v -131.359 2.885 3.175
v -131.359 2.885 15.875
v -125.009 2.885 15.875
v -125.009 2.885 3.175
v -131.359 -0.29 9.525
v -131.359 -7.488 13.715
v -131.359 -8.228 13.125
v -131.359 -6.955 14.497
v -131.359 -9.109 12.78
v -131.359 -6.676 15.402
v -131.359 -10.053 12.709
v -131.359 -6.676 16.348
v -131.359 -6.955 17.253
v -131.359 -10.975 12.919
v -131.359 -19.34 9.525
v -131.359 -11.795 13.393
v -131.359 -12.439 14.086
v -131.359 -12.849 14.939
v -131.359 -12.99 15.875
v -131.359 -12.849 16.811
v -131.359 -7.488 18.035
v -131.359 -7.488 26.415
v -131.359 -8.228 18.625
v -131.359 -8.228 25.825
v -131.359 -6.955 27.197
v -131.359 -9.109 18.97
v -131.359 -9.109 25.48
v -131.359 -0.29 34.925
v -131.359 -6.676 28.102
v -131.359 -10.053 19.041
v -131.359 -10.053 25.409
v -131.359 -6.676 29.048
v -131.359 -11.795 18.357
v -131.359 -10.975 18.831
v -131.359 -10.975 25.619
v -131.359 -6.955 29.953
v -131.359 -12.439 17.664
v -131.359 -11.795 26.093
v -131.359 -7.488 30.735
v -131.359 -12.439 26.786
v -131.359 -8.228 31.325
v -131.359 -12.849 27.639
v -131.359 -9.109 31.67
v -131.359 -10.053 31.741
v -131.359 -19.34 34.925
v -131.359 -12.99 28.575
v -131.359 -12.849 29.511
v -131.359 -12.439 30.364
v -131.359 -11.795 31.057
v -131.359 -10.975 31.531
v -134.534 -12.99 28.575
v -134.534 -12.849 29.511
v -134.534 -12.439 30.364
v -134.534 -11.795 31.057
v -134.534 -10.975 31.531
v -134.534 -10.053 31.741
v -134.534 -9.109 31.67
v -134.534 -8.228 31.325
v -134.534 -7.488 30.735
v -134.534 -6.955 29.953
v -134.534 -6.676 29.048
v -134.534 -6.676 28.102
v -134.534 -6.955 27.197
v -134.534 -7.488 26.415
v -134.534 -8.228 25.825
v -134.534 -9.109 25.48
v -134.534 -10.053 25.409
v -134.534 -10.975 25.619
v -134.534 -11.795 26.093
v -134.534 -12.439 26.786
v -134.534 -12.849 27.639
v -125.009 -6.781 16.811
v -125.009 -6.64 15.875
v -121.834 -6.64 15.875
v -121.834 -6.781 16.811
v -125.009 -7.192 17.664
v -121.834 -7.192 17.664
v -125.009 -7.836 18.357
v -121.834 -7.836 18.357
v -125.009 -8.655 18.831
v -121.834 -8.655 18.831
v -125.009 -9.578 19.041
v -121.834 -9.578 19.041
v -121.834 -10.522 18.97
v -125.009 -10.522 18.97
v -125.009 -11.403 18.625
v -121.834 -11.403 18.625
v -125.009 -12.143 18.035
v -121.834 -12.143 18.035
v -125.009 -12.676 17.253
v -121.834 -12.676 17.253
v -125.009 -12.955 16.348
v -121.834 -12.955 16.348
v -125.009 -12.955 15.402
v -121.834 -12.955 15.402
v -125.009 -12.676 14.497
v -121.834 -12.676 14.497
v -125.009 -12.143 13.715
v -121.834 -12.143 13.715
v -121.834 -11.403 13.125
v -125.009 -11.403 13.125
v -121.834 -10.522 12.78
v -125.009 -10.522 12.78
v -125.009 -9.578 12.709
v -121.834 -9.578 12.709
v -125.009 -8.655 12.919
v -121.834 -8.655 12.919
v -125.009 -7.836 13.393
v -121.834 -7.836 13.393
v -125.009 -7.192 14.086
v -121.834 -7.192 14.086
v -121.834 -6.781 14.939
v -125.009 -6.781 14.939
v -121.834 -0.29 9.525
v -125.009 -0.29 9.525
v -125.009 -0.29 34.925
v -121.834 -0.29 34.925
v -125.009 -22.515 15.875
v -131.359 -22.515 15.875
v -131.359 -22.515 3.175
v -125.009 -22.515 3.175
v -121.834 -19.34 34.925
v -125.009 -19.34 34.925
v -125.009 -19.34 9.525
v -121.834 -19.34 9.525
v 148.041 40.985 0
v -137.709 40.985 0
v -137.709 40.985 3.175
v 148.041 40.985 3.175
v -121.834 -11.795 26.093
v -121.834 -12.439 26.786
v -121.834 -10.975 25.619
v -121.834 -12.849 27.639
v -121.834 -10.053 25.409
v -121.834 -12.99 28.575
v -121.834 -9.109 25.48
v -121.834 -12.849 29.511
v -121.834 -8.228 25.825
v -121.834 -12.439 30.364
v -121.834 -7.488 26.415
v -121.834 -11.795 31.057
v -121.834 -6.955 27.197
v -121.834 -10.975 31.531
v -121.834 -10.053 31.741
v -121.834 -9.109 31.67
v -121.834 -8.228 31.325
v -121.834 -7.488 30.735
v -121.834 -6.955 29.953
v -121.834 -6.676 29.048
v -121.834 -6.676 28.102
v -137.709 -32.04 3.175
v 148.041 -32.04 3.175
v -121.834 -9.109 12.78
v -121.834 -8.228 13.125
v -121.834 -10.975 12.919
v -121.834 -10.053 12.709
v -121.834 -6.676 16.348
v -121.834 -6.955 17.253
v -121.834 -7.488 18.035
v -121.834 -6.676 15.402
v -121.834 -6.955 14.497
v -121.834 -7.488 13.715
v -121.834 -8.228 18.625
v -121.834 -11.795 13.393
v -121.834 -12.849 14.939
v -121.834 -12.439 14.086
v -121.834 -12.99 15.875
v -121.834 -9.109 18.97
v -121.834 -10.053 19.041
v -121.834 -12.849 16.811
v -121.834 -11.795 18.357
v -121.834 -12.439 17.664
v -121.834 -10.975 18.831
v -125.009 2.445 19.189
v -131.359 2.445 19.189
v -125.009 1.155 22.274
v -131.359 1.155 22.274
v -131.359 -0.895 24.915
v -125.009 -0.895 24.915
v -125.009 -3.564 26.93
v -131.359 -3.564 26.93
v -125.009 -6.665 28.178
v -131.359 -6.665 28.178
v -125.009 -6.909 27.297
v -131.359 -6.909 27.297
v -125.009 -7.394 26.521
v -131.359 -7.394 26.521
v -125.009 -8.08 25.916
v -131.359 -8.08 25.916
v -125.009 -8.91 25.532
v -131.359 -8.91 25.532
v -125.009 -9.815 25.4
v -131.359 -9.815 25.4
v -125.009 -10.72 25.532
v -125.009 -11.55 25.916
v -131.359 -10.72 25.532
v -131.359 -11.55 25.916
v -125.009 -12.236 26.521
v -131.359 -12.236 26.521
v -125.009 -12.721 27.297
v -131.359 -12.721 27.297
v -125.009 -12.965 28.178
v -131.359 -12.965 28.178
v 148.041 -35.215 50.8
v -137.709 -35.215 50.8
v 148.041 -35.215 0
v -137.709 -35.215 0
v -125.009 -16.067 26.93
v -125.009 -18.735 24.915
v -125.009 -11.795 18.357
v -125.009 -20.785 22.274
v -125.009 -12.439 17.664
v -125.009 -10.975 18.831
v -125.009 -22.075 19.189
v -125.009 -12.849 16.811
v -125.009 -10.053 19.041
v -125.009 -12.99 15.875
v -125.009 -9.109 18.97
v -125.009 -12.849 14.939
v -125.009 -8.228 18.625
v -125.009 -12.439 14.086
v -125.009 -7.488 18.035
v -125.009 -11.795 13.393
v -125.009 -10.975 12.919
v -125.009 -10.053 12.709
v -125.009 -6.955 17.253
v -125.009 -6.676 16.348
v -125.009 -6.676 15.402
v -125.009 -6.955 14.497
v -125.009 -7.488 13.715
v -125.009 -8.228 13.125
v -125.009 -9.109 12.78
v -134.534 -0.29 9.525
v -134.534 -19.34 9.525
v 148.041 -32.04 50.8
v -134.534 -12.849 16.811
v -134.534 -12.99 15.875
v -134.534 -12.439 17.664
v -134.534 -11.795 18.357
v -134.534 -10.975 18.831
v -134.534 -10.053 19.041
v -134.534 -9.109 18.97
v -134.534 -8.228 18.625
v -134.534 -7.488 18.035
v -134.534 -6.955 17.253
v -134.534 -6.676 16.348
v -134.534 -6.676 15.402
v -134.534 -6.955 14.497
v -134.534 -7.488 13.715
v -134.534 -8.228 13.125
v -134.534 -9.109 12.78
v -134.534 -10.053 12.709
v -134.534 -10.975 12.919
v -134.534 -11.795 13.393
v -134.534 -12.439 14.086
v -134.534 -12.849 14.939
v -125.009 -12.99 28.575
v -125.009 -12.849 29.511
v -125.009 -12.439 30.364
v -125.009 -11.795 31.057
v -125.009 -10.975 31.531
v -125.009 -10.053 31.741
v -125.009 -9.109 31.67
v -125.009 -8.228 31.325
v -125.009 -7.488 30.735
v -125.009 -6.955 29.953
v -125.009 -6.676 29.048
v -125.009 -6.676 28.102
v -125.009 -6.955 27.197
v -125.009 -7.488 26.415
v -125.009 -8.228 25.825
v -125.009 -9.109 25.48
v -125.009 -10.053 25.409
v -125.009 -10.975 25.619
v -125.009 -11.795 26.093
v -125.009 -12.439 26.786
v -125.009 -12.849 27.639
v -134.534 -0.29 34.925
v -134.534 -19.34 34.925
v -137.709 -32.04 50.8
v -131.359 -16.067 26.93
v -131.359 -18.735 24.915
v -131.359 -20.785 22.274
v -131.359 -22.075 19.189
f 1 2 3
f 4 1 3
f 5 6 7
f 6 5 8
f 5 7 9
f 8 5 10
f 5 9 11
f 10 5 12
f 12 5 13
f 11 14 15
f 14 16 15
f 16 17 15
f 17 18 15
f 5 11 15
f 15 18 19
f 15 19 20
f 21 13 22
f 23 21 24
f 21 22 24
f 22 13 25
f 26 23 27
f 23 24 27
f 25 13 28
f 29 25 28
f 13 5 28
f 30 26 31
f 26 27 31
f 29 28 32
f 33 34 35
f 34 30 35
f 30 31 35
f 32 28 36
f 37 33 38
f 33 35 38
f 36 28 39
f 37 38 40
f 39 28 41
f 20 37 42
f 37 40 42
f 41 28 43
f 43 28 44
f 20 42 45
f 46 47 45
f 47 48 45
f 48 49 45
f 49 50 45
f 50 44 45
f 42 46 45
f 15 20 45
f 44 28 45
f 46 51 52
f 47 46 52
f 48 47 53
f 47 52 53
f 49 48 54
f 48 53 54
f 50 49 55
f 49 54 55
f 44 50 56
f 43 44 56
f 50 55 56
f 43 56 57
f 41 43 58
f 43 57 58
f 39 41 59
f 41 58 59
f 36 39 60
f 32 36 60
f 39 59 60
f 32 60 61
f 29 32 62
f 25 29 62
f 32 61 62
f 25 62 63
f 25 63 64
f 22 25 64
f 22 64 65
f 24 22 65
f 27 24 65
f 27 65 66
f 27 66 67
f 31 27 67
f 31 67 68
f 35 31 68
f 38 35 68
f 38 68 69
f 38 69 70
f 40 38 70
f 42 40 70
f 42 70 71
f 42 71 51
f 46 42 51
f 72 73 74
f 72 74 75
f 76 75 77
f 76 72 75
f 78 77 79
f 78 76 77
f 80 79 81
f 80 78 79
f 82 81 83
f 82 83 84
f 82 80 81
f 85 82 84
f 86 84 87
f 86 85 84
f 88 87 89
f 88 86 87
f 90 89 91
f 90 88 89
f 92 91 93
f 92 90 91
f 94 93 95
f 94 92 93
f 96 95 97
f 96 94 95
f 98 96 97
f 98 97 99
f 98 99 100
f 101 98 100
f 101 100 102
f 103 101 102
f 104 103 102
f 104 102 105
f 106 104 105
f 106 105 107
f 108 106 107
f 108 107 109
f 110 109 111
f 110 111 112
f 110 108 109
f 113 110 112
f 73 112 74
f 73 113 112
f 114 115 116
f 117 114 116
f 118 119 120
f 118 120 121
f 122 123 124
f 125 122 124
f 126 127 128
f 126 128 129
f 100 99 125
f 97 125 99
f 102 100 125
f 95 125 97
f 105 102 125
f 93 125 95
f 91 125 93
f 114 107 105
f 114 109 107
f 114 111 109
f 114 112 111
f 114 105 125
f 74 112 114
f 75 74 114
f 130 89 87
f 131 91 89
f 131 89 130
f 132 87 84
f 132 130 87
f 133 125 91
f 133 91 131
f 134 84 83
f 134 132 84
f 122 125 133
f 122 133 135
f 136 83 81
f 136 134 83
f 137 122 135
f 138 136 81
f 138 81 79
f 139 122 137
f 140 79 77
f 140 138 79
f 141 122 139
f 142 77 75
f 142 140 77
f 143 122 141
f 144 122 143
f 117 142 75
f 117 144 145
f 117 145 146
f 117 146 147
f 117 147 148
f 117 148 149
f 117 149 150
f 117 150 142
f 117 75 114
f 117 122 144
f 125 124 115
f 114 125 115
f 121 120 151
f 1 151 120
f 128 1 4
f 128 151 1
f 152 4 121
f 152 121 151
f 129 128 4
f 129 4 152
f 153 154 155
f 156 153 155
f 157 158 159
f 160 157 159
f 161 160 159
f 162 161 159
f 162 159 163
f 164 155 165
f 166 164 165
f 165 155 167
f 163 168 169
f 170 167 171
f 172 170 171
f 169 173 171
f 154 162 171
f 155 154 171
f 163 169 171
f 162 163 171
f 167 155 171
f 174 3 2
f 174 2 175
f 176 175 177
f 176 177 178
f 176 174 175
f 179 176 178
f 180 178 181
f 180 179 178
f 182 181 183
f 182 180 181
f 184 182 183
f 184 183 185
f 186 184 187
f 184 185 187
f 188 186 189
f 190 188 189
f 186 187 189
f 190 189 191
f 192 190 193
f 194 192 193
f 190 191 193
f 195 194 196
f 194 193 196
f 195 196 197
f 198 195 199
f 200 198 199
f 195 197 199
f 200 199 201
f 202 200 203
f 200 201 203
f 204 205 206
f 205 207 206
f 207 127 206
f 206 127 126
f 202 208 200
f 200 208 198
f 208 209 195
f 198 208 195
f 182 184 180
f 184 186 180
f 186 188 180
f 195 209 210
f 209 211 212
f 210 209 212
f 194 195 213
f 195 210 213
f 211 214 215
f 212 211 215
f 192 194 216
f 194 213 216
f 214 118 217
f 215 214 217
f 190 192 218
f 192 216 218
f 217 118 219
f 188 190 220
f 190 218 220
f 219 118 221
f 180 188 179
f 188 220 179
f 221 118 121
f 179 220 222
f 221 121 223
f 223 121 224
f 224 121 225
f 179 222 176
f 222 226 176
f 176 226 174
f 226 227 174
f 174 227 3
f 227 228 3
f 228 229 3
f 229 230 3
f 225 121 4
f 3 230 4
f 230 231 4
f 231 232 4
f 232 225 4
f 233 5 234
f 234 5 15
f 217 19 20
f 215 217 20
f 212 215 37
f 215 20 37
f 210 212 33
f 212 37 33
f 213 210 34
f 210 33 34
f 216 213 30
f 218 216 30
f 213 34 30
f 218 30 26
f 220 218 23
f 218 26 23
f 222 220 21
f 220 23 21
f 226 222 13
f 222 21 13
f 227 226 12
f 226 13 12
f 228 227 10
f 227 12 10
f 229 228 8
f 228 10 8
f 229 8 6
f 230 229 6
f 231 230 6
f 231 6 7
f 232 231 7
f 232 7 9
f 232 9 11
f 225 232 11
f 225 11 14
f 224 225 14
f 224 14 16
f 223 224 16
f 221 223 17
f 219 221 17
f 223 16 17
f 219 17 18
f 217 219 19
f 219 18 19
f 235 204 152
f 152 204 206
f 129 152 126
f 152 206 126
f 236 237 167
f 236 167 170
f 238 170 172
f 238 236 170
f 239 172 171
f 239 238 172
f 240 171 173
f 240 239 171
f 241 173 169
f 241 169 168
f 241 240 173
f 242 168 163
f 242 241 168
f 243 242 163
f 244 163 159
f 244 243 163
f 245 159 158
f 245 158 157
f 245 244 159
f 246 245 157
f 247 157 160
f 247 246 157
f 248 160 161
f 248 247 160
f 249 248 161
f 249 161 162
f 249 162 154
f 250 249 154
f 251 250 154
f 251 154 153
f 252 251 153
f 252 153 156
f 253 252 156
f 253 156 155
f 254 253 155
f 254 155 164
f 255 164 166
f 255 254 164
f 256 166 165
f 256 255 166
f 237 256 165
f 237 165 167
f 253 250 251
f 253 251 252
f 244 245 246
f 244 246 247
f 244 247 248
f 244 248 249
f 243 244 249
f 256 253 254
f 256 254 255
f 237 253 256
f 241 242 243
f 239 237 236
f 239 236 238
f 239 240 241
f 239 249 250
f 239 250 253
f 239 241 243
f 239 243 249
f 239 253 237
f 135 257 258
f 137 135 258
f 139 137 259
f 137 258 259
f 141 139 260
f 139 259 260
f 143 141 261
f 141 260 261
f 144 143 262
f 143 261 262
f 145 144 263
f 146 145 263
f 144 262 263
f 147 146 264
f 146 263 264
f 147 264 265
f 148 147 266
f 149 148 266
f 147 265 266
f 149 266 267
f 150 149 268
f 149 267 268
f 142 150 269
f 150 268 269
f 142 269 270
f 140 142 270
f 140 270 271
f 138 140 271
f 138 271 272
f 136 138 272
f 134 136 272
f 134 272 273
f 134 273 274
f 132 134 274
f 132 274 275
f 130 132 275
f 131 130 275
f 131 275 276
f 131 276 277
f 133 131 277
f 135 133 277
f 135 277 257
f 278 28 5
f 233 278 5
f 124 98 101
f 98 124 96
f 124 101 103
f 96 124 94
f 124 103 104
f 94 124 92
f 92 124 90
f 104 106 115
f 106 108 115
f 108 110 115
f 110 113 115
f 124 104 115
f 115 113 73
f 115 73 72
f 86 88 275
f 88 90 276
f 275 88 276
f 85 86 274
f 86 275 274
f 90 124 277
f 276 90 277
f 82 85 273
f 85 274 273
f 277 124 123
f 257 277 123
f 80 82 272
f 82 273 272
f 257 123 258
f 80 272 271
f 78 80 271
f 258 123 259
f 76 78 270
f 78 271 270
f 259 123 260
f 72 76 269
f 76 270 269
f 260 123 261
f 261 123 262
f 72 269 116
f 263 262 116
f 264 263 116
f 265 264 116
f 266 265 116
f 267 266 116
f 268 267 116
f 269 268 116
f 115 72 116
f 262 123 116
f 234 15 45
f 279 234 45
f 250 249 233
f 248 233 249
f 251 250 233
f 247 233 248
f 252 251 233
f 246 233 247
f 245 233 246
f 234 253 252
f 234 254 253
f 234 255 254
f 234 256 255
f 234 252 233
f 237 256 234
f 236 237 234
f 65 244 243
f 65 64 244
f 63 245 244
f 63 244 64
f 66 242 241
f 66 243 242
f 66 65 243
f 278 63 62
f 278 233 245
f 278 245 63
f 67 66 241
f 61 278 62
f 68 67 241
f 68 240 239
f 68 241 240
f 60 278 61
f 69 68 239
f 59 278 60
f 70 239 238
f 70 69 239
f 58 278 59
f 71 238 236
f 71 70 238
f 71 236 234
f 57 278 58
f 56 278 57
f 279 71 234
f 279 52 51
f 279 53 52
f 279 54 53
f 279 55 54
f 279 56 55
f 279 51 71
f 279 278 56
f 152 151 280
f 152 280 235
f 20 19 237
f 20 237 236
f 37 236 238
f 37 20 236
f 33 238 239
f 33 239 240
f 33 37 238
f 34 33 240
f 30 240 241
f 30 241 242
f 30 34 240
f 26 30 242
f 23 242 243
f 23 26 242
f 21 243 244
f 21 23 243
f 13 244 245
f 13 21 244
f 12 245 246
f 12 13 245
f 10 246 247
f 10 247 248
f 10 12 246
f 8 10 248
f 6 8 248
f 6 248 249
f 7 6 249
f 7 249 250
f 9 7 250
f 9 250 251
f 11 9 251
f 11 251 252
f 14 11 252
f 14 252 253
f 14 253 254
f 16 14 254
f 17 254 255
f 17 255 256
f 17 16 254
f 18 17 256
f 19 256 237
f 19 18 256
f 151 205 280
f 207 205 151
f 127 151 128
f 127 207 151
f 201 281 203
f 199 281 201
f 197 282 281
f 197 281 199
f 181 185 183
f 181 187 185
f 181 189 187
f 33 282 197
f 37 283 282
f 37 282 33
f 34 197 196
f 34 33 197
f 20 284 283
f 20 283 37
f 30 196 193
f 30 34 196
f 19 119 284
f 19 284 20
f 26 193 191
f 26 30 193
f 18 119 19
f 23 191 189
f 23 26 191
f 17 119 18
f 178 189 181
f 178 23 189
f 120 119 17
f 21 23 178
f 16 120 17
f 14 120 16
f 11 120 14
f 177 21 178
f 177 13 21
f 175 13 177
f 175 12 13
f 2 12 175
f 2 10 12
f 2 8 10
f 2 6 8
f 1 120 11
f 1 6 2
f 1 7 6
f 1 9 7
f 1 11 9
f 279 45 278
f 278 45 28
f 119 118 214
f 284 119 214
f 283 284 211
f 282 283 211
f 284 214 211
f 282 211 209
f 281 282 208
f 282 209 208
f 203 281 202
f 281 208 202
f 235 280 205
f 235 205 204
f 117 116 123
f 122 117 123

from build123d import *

# Parameters (mm, degrees)
F0_W      = 285.75
F0_H      = 76.2
F1_DEPTH  = 3.175
F2_W      = 285.75
F2_H      = 3.175
F3_DEPTH  = 47.625
F4_W      = 6.35
F4_H      = 25.4
F5_DEPTH  = 25.4
F6_R      = 12.69999
F7_R      = 3.175
F8_DEPTH  = 6.35
F9_R      = 3.175
F10_DEPTH = 3.175
F11_R     = 3.175
F12_DEPTH = 3.175
F13_R     = 3.175
F14_DEPTH = 25.4
F15_R     = 3.175
F16_DEPTH = 25.4
F17_R     = 3.175
F18_DEPTH = 12.7
F20_DEPTH = 6.35


# Not quite as in the source:
# - a fillet or chamfer is up to 0.001 mm smaller than in the source, because OpenCascade refuses the exact size
# - ends of sketch curves that miss each other by under 0.0002 mm in the source are joined


with BuildPart() as f1:
    # F0 (on Top) → F1 (new body)
    with BuildSketch(Plane.XY):
        with Locations((5.1656402647, 2.8847559522)):
            Rectangle(F0_W, F0_H)
    extrude(amount=F1_DEPTH)

    # F2 (on face) → F3 (join)
    with BuildSketch(Plane.XY.offset(3.175)):
        with Locations((5.1656402647, -33.6277440478)):
            Rectangle(F2_W, F2_H)
    extrude(amount=F3_DEPTH)

    # F4 (on face) → F5 (join)
    with BuildSketch(Plane.XY.offset(3.175)):
        with Locations((-128.1843597353, -9.8152440478)):
            Rectangle(F4_W, F4_H)
    extrude(amount=F5_DEPTH)

    # F6 (radius 12.7 in the source; OpenCascade refuses exactly that, so slightly less here)
    f6_edges = [f1.edges().sort_by_distance(p)[0] for p in [
        (-128.18436, 2.884756, 28.575),
        (-128.18436, -22.515244, 28.575),
    ]]
    fillet(f6_edges, radius=F6_R)

    # F7 (on face) → F8 (cut)
    with BuildSketch(Plane(origin=(-131.3593597353, 0, 0), x_dir=(0, -1, 0), z_dir=(-1, 0, 0))):
        with Locations((9.8152440478, 15.875)):
            Circle(F7_R)
    extrude(amount=-F8_DEPTH, mode=Mode.SUBTRACT)


with BuildPart() as f10:
    # F9 (on face) → F10 (new body)
    with BuildSketch(Plane.YZ.offset(-125.0093597353)):
        with BuildLine():
            Line((-19.3402440478, 34.925), (-19.3402440478, 24.275266633))
            ThreePointArc((-19.3402440478, 24.275266633), (-15.0405086236, 27.4502620758), (-9.8152540478, 28.575))
            ThreePointArc((-9.8152540478, 28.575), (-4.589979472, 27.4502620758), (-0.2902440478, 24.275266633))
            Line((-0.2902440478, 24.275266633), (-0.2902440478, 34.925))
            Line((-0.2902440478, 34.925), (-19.3402440478, 34.925))
        make_face()
        with BuildLine():
            Line((-19.3402440478, 24.275266633), (-19.3402440478, 9.525))
            Line((-19.3402440478, 9.525), (-0.2902440478, 9.525))
            Line((-0.2902440478, 9.525), (-0.2902440478, 24.275266633))
            ThreePointArc((-0.2902440478, 24.275266633), (-4.589979472, 27.4502620758), (-9.8152340478, 28.575))
            ThreePointArc((-9.8152340478, 28.575), (-15.0405086236, 27.4502620758), (-19.3402440478, 24.275266633))
        make_face()
        with Locations((-9.8152440478, 15.875)):
            Circle(F9_R, mode=Mode.SUBTRACT)
    extrude(amount=F10_DEPTH)


with BuildPart() as f12:
    # F11 (on face) → F12 (new body)
    with BuildSketch(Plane(origin=(-131.3593597353, 0, 0), x_dir=(0, -1, 0), z_dir=(-1, 0, 0))):
        with BuildLine():
            ThreePointArc((9.8152340478, 28.575), (4.589979472, 27.4502620758), (0.2902440478, 24.275266633))
            Line((0.2902440478, 24.275266633), (0.2902440478, 9.525))
            Line((0.2902440478, 9.525), (19.3402440478, 9.525))
            Line((19.3402440478, 9.525), (19.3402440478, 24.275266633))
            ThreePointArc((19.3402440478, 24.275266633), (15.0405086236, 27.4502620758), (9.8152340478, 28.575))
        make_face()
        with Locations((9.8152440478, 15.875)):
            Circle(F11_R, mode=Mode.SUBTRACT)
        with BuildLine():
            Line((19.3402440478, 34.925), (0.2902440478, 34.925))
            Line((0.2902440478, 34.925), (0.2902440478, 24.275266633))
            ThreePointArc((0.2902440478, 24.275266633), (4.589979472, 27.4502620758), (9.8152340478, 28.575))
            ThreePointArc((9.8152340478, 28.575), (15.0405086236, 27.4502620758), (19.3402440478, 24.275266633))
            Line((19.3402440478, 24.275266633), (19.3402440478, 34.925))
        make_face()
    extrude(amount=F12_DEPTH)


with BuildPart() as f14_tool:
    # F13 (on face) → F14 (new body)
    with BuildSketch(Plane(origin=(-134.5343597353, 0, 0), x_dir=(0, -1, 0), z_dir=(-1, 0, 0))):
        with Locations((9.8152440478, 28.575)):
            Circle(F13_R)
    extrude(amount=-F14_DEPTH)


with BuildPart() as f1_1:
    add(f1.part)

    # F14: cut by f14_tool
    add(f14_tool.part, mode=Mode.SUBTRACT)

    # F15 (on face) → F16 (cut)
    with BuildSketch(Plane.YZ.offset(-121.8343597353)):
        with Locations((-9.8152440478, 28.575)):
            Circle(F15_R)
    extrude(amount=-F16_DEPTH, mode=Mode.SUBTRACT)

    # F19 (on face) → F20 (cut)
    with BuildSketch(Plane(origin=(-131.3593597353, 0, 0), x_dir=(0, -1, 0), z_dir=(-1, 0, 0))):
        with BuildLine():
            ThreePointArc((12.9653419757, 28.1781271679), (12.9840124143, 28.376173343), (12.9902440478, 28.575))
            ThreePointArc((12.9902440478, 28.575), (9.6164173909, 31.7437683665), (6.66514612, 28.1781271679))
            ThreePointArc((6.66514612, 28.1781271679), (9.8152440478, 25.4), (12.9653419757, 28.1781271679))
        make_face()
    extrude(amount=-F20_DEPTH, mode=Mode.SUBTRACT)


with BuildPart() as f10_1:
    add(f10.part)

    # F14: cut by f14_tool
    add(f14_tool.part, mode=Mode.SUBTRACT)


with BuildPart() as f12_1:
    add(f12.part)

    # F14: cut by f14_tool
    add(f14_tool.part, mode=Mode.SUBTRACT)


with BuildPart() as f18:
    # F17 (on face) → F18 (new body)
    with BuildSketch(Plane(origin=(-134.5343597353, 0, 0), x_dir=(0, -1, 0), z_dir=(-1, 0, 0))):
        with Locations((9.8152440478, 15.875)):
            Circle(F17_R)
    extrude(amount=-F18_DEPTH)


solid = Compound([f1_1.part, f10_1.part, f12_1.part, f18.part])
